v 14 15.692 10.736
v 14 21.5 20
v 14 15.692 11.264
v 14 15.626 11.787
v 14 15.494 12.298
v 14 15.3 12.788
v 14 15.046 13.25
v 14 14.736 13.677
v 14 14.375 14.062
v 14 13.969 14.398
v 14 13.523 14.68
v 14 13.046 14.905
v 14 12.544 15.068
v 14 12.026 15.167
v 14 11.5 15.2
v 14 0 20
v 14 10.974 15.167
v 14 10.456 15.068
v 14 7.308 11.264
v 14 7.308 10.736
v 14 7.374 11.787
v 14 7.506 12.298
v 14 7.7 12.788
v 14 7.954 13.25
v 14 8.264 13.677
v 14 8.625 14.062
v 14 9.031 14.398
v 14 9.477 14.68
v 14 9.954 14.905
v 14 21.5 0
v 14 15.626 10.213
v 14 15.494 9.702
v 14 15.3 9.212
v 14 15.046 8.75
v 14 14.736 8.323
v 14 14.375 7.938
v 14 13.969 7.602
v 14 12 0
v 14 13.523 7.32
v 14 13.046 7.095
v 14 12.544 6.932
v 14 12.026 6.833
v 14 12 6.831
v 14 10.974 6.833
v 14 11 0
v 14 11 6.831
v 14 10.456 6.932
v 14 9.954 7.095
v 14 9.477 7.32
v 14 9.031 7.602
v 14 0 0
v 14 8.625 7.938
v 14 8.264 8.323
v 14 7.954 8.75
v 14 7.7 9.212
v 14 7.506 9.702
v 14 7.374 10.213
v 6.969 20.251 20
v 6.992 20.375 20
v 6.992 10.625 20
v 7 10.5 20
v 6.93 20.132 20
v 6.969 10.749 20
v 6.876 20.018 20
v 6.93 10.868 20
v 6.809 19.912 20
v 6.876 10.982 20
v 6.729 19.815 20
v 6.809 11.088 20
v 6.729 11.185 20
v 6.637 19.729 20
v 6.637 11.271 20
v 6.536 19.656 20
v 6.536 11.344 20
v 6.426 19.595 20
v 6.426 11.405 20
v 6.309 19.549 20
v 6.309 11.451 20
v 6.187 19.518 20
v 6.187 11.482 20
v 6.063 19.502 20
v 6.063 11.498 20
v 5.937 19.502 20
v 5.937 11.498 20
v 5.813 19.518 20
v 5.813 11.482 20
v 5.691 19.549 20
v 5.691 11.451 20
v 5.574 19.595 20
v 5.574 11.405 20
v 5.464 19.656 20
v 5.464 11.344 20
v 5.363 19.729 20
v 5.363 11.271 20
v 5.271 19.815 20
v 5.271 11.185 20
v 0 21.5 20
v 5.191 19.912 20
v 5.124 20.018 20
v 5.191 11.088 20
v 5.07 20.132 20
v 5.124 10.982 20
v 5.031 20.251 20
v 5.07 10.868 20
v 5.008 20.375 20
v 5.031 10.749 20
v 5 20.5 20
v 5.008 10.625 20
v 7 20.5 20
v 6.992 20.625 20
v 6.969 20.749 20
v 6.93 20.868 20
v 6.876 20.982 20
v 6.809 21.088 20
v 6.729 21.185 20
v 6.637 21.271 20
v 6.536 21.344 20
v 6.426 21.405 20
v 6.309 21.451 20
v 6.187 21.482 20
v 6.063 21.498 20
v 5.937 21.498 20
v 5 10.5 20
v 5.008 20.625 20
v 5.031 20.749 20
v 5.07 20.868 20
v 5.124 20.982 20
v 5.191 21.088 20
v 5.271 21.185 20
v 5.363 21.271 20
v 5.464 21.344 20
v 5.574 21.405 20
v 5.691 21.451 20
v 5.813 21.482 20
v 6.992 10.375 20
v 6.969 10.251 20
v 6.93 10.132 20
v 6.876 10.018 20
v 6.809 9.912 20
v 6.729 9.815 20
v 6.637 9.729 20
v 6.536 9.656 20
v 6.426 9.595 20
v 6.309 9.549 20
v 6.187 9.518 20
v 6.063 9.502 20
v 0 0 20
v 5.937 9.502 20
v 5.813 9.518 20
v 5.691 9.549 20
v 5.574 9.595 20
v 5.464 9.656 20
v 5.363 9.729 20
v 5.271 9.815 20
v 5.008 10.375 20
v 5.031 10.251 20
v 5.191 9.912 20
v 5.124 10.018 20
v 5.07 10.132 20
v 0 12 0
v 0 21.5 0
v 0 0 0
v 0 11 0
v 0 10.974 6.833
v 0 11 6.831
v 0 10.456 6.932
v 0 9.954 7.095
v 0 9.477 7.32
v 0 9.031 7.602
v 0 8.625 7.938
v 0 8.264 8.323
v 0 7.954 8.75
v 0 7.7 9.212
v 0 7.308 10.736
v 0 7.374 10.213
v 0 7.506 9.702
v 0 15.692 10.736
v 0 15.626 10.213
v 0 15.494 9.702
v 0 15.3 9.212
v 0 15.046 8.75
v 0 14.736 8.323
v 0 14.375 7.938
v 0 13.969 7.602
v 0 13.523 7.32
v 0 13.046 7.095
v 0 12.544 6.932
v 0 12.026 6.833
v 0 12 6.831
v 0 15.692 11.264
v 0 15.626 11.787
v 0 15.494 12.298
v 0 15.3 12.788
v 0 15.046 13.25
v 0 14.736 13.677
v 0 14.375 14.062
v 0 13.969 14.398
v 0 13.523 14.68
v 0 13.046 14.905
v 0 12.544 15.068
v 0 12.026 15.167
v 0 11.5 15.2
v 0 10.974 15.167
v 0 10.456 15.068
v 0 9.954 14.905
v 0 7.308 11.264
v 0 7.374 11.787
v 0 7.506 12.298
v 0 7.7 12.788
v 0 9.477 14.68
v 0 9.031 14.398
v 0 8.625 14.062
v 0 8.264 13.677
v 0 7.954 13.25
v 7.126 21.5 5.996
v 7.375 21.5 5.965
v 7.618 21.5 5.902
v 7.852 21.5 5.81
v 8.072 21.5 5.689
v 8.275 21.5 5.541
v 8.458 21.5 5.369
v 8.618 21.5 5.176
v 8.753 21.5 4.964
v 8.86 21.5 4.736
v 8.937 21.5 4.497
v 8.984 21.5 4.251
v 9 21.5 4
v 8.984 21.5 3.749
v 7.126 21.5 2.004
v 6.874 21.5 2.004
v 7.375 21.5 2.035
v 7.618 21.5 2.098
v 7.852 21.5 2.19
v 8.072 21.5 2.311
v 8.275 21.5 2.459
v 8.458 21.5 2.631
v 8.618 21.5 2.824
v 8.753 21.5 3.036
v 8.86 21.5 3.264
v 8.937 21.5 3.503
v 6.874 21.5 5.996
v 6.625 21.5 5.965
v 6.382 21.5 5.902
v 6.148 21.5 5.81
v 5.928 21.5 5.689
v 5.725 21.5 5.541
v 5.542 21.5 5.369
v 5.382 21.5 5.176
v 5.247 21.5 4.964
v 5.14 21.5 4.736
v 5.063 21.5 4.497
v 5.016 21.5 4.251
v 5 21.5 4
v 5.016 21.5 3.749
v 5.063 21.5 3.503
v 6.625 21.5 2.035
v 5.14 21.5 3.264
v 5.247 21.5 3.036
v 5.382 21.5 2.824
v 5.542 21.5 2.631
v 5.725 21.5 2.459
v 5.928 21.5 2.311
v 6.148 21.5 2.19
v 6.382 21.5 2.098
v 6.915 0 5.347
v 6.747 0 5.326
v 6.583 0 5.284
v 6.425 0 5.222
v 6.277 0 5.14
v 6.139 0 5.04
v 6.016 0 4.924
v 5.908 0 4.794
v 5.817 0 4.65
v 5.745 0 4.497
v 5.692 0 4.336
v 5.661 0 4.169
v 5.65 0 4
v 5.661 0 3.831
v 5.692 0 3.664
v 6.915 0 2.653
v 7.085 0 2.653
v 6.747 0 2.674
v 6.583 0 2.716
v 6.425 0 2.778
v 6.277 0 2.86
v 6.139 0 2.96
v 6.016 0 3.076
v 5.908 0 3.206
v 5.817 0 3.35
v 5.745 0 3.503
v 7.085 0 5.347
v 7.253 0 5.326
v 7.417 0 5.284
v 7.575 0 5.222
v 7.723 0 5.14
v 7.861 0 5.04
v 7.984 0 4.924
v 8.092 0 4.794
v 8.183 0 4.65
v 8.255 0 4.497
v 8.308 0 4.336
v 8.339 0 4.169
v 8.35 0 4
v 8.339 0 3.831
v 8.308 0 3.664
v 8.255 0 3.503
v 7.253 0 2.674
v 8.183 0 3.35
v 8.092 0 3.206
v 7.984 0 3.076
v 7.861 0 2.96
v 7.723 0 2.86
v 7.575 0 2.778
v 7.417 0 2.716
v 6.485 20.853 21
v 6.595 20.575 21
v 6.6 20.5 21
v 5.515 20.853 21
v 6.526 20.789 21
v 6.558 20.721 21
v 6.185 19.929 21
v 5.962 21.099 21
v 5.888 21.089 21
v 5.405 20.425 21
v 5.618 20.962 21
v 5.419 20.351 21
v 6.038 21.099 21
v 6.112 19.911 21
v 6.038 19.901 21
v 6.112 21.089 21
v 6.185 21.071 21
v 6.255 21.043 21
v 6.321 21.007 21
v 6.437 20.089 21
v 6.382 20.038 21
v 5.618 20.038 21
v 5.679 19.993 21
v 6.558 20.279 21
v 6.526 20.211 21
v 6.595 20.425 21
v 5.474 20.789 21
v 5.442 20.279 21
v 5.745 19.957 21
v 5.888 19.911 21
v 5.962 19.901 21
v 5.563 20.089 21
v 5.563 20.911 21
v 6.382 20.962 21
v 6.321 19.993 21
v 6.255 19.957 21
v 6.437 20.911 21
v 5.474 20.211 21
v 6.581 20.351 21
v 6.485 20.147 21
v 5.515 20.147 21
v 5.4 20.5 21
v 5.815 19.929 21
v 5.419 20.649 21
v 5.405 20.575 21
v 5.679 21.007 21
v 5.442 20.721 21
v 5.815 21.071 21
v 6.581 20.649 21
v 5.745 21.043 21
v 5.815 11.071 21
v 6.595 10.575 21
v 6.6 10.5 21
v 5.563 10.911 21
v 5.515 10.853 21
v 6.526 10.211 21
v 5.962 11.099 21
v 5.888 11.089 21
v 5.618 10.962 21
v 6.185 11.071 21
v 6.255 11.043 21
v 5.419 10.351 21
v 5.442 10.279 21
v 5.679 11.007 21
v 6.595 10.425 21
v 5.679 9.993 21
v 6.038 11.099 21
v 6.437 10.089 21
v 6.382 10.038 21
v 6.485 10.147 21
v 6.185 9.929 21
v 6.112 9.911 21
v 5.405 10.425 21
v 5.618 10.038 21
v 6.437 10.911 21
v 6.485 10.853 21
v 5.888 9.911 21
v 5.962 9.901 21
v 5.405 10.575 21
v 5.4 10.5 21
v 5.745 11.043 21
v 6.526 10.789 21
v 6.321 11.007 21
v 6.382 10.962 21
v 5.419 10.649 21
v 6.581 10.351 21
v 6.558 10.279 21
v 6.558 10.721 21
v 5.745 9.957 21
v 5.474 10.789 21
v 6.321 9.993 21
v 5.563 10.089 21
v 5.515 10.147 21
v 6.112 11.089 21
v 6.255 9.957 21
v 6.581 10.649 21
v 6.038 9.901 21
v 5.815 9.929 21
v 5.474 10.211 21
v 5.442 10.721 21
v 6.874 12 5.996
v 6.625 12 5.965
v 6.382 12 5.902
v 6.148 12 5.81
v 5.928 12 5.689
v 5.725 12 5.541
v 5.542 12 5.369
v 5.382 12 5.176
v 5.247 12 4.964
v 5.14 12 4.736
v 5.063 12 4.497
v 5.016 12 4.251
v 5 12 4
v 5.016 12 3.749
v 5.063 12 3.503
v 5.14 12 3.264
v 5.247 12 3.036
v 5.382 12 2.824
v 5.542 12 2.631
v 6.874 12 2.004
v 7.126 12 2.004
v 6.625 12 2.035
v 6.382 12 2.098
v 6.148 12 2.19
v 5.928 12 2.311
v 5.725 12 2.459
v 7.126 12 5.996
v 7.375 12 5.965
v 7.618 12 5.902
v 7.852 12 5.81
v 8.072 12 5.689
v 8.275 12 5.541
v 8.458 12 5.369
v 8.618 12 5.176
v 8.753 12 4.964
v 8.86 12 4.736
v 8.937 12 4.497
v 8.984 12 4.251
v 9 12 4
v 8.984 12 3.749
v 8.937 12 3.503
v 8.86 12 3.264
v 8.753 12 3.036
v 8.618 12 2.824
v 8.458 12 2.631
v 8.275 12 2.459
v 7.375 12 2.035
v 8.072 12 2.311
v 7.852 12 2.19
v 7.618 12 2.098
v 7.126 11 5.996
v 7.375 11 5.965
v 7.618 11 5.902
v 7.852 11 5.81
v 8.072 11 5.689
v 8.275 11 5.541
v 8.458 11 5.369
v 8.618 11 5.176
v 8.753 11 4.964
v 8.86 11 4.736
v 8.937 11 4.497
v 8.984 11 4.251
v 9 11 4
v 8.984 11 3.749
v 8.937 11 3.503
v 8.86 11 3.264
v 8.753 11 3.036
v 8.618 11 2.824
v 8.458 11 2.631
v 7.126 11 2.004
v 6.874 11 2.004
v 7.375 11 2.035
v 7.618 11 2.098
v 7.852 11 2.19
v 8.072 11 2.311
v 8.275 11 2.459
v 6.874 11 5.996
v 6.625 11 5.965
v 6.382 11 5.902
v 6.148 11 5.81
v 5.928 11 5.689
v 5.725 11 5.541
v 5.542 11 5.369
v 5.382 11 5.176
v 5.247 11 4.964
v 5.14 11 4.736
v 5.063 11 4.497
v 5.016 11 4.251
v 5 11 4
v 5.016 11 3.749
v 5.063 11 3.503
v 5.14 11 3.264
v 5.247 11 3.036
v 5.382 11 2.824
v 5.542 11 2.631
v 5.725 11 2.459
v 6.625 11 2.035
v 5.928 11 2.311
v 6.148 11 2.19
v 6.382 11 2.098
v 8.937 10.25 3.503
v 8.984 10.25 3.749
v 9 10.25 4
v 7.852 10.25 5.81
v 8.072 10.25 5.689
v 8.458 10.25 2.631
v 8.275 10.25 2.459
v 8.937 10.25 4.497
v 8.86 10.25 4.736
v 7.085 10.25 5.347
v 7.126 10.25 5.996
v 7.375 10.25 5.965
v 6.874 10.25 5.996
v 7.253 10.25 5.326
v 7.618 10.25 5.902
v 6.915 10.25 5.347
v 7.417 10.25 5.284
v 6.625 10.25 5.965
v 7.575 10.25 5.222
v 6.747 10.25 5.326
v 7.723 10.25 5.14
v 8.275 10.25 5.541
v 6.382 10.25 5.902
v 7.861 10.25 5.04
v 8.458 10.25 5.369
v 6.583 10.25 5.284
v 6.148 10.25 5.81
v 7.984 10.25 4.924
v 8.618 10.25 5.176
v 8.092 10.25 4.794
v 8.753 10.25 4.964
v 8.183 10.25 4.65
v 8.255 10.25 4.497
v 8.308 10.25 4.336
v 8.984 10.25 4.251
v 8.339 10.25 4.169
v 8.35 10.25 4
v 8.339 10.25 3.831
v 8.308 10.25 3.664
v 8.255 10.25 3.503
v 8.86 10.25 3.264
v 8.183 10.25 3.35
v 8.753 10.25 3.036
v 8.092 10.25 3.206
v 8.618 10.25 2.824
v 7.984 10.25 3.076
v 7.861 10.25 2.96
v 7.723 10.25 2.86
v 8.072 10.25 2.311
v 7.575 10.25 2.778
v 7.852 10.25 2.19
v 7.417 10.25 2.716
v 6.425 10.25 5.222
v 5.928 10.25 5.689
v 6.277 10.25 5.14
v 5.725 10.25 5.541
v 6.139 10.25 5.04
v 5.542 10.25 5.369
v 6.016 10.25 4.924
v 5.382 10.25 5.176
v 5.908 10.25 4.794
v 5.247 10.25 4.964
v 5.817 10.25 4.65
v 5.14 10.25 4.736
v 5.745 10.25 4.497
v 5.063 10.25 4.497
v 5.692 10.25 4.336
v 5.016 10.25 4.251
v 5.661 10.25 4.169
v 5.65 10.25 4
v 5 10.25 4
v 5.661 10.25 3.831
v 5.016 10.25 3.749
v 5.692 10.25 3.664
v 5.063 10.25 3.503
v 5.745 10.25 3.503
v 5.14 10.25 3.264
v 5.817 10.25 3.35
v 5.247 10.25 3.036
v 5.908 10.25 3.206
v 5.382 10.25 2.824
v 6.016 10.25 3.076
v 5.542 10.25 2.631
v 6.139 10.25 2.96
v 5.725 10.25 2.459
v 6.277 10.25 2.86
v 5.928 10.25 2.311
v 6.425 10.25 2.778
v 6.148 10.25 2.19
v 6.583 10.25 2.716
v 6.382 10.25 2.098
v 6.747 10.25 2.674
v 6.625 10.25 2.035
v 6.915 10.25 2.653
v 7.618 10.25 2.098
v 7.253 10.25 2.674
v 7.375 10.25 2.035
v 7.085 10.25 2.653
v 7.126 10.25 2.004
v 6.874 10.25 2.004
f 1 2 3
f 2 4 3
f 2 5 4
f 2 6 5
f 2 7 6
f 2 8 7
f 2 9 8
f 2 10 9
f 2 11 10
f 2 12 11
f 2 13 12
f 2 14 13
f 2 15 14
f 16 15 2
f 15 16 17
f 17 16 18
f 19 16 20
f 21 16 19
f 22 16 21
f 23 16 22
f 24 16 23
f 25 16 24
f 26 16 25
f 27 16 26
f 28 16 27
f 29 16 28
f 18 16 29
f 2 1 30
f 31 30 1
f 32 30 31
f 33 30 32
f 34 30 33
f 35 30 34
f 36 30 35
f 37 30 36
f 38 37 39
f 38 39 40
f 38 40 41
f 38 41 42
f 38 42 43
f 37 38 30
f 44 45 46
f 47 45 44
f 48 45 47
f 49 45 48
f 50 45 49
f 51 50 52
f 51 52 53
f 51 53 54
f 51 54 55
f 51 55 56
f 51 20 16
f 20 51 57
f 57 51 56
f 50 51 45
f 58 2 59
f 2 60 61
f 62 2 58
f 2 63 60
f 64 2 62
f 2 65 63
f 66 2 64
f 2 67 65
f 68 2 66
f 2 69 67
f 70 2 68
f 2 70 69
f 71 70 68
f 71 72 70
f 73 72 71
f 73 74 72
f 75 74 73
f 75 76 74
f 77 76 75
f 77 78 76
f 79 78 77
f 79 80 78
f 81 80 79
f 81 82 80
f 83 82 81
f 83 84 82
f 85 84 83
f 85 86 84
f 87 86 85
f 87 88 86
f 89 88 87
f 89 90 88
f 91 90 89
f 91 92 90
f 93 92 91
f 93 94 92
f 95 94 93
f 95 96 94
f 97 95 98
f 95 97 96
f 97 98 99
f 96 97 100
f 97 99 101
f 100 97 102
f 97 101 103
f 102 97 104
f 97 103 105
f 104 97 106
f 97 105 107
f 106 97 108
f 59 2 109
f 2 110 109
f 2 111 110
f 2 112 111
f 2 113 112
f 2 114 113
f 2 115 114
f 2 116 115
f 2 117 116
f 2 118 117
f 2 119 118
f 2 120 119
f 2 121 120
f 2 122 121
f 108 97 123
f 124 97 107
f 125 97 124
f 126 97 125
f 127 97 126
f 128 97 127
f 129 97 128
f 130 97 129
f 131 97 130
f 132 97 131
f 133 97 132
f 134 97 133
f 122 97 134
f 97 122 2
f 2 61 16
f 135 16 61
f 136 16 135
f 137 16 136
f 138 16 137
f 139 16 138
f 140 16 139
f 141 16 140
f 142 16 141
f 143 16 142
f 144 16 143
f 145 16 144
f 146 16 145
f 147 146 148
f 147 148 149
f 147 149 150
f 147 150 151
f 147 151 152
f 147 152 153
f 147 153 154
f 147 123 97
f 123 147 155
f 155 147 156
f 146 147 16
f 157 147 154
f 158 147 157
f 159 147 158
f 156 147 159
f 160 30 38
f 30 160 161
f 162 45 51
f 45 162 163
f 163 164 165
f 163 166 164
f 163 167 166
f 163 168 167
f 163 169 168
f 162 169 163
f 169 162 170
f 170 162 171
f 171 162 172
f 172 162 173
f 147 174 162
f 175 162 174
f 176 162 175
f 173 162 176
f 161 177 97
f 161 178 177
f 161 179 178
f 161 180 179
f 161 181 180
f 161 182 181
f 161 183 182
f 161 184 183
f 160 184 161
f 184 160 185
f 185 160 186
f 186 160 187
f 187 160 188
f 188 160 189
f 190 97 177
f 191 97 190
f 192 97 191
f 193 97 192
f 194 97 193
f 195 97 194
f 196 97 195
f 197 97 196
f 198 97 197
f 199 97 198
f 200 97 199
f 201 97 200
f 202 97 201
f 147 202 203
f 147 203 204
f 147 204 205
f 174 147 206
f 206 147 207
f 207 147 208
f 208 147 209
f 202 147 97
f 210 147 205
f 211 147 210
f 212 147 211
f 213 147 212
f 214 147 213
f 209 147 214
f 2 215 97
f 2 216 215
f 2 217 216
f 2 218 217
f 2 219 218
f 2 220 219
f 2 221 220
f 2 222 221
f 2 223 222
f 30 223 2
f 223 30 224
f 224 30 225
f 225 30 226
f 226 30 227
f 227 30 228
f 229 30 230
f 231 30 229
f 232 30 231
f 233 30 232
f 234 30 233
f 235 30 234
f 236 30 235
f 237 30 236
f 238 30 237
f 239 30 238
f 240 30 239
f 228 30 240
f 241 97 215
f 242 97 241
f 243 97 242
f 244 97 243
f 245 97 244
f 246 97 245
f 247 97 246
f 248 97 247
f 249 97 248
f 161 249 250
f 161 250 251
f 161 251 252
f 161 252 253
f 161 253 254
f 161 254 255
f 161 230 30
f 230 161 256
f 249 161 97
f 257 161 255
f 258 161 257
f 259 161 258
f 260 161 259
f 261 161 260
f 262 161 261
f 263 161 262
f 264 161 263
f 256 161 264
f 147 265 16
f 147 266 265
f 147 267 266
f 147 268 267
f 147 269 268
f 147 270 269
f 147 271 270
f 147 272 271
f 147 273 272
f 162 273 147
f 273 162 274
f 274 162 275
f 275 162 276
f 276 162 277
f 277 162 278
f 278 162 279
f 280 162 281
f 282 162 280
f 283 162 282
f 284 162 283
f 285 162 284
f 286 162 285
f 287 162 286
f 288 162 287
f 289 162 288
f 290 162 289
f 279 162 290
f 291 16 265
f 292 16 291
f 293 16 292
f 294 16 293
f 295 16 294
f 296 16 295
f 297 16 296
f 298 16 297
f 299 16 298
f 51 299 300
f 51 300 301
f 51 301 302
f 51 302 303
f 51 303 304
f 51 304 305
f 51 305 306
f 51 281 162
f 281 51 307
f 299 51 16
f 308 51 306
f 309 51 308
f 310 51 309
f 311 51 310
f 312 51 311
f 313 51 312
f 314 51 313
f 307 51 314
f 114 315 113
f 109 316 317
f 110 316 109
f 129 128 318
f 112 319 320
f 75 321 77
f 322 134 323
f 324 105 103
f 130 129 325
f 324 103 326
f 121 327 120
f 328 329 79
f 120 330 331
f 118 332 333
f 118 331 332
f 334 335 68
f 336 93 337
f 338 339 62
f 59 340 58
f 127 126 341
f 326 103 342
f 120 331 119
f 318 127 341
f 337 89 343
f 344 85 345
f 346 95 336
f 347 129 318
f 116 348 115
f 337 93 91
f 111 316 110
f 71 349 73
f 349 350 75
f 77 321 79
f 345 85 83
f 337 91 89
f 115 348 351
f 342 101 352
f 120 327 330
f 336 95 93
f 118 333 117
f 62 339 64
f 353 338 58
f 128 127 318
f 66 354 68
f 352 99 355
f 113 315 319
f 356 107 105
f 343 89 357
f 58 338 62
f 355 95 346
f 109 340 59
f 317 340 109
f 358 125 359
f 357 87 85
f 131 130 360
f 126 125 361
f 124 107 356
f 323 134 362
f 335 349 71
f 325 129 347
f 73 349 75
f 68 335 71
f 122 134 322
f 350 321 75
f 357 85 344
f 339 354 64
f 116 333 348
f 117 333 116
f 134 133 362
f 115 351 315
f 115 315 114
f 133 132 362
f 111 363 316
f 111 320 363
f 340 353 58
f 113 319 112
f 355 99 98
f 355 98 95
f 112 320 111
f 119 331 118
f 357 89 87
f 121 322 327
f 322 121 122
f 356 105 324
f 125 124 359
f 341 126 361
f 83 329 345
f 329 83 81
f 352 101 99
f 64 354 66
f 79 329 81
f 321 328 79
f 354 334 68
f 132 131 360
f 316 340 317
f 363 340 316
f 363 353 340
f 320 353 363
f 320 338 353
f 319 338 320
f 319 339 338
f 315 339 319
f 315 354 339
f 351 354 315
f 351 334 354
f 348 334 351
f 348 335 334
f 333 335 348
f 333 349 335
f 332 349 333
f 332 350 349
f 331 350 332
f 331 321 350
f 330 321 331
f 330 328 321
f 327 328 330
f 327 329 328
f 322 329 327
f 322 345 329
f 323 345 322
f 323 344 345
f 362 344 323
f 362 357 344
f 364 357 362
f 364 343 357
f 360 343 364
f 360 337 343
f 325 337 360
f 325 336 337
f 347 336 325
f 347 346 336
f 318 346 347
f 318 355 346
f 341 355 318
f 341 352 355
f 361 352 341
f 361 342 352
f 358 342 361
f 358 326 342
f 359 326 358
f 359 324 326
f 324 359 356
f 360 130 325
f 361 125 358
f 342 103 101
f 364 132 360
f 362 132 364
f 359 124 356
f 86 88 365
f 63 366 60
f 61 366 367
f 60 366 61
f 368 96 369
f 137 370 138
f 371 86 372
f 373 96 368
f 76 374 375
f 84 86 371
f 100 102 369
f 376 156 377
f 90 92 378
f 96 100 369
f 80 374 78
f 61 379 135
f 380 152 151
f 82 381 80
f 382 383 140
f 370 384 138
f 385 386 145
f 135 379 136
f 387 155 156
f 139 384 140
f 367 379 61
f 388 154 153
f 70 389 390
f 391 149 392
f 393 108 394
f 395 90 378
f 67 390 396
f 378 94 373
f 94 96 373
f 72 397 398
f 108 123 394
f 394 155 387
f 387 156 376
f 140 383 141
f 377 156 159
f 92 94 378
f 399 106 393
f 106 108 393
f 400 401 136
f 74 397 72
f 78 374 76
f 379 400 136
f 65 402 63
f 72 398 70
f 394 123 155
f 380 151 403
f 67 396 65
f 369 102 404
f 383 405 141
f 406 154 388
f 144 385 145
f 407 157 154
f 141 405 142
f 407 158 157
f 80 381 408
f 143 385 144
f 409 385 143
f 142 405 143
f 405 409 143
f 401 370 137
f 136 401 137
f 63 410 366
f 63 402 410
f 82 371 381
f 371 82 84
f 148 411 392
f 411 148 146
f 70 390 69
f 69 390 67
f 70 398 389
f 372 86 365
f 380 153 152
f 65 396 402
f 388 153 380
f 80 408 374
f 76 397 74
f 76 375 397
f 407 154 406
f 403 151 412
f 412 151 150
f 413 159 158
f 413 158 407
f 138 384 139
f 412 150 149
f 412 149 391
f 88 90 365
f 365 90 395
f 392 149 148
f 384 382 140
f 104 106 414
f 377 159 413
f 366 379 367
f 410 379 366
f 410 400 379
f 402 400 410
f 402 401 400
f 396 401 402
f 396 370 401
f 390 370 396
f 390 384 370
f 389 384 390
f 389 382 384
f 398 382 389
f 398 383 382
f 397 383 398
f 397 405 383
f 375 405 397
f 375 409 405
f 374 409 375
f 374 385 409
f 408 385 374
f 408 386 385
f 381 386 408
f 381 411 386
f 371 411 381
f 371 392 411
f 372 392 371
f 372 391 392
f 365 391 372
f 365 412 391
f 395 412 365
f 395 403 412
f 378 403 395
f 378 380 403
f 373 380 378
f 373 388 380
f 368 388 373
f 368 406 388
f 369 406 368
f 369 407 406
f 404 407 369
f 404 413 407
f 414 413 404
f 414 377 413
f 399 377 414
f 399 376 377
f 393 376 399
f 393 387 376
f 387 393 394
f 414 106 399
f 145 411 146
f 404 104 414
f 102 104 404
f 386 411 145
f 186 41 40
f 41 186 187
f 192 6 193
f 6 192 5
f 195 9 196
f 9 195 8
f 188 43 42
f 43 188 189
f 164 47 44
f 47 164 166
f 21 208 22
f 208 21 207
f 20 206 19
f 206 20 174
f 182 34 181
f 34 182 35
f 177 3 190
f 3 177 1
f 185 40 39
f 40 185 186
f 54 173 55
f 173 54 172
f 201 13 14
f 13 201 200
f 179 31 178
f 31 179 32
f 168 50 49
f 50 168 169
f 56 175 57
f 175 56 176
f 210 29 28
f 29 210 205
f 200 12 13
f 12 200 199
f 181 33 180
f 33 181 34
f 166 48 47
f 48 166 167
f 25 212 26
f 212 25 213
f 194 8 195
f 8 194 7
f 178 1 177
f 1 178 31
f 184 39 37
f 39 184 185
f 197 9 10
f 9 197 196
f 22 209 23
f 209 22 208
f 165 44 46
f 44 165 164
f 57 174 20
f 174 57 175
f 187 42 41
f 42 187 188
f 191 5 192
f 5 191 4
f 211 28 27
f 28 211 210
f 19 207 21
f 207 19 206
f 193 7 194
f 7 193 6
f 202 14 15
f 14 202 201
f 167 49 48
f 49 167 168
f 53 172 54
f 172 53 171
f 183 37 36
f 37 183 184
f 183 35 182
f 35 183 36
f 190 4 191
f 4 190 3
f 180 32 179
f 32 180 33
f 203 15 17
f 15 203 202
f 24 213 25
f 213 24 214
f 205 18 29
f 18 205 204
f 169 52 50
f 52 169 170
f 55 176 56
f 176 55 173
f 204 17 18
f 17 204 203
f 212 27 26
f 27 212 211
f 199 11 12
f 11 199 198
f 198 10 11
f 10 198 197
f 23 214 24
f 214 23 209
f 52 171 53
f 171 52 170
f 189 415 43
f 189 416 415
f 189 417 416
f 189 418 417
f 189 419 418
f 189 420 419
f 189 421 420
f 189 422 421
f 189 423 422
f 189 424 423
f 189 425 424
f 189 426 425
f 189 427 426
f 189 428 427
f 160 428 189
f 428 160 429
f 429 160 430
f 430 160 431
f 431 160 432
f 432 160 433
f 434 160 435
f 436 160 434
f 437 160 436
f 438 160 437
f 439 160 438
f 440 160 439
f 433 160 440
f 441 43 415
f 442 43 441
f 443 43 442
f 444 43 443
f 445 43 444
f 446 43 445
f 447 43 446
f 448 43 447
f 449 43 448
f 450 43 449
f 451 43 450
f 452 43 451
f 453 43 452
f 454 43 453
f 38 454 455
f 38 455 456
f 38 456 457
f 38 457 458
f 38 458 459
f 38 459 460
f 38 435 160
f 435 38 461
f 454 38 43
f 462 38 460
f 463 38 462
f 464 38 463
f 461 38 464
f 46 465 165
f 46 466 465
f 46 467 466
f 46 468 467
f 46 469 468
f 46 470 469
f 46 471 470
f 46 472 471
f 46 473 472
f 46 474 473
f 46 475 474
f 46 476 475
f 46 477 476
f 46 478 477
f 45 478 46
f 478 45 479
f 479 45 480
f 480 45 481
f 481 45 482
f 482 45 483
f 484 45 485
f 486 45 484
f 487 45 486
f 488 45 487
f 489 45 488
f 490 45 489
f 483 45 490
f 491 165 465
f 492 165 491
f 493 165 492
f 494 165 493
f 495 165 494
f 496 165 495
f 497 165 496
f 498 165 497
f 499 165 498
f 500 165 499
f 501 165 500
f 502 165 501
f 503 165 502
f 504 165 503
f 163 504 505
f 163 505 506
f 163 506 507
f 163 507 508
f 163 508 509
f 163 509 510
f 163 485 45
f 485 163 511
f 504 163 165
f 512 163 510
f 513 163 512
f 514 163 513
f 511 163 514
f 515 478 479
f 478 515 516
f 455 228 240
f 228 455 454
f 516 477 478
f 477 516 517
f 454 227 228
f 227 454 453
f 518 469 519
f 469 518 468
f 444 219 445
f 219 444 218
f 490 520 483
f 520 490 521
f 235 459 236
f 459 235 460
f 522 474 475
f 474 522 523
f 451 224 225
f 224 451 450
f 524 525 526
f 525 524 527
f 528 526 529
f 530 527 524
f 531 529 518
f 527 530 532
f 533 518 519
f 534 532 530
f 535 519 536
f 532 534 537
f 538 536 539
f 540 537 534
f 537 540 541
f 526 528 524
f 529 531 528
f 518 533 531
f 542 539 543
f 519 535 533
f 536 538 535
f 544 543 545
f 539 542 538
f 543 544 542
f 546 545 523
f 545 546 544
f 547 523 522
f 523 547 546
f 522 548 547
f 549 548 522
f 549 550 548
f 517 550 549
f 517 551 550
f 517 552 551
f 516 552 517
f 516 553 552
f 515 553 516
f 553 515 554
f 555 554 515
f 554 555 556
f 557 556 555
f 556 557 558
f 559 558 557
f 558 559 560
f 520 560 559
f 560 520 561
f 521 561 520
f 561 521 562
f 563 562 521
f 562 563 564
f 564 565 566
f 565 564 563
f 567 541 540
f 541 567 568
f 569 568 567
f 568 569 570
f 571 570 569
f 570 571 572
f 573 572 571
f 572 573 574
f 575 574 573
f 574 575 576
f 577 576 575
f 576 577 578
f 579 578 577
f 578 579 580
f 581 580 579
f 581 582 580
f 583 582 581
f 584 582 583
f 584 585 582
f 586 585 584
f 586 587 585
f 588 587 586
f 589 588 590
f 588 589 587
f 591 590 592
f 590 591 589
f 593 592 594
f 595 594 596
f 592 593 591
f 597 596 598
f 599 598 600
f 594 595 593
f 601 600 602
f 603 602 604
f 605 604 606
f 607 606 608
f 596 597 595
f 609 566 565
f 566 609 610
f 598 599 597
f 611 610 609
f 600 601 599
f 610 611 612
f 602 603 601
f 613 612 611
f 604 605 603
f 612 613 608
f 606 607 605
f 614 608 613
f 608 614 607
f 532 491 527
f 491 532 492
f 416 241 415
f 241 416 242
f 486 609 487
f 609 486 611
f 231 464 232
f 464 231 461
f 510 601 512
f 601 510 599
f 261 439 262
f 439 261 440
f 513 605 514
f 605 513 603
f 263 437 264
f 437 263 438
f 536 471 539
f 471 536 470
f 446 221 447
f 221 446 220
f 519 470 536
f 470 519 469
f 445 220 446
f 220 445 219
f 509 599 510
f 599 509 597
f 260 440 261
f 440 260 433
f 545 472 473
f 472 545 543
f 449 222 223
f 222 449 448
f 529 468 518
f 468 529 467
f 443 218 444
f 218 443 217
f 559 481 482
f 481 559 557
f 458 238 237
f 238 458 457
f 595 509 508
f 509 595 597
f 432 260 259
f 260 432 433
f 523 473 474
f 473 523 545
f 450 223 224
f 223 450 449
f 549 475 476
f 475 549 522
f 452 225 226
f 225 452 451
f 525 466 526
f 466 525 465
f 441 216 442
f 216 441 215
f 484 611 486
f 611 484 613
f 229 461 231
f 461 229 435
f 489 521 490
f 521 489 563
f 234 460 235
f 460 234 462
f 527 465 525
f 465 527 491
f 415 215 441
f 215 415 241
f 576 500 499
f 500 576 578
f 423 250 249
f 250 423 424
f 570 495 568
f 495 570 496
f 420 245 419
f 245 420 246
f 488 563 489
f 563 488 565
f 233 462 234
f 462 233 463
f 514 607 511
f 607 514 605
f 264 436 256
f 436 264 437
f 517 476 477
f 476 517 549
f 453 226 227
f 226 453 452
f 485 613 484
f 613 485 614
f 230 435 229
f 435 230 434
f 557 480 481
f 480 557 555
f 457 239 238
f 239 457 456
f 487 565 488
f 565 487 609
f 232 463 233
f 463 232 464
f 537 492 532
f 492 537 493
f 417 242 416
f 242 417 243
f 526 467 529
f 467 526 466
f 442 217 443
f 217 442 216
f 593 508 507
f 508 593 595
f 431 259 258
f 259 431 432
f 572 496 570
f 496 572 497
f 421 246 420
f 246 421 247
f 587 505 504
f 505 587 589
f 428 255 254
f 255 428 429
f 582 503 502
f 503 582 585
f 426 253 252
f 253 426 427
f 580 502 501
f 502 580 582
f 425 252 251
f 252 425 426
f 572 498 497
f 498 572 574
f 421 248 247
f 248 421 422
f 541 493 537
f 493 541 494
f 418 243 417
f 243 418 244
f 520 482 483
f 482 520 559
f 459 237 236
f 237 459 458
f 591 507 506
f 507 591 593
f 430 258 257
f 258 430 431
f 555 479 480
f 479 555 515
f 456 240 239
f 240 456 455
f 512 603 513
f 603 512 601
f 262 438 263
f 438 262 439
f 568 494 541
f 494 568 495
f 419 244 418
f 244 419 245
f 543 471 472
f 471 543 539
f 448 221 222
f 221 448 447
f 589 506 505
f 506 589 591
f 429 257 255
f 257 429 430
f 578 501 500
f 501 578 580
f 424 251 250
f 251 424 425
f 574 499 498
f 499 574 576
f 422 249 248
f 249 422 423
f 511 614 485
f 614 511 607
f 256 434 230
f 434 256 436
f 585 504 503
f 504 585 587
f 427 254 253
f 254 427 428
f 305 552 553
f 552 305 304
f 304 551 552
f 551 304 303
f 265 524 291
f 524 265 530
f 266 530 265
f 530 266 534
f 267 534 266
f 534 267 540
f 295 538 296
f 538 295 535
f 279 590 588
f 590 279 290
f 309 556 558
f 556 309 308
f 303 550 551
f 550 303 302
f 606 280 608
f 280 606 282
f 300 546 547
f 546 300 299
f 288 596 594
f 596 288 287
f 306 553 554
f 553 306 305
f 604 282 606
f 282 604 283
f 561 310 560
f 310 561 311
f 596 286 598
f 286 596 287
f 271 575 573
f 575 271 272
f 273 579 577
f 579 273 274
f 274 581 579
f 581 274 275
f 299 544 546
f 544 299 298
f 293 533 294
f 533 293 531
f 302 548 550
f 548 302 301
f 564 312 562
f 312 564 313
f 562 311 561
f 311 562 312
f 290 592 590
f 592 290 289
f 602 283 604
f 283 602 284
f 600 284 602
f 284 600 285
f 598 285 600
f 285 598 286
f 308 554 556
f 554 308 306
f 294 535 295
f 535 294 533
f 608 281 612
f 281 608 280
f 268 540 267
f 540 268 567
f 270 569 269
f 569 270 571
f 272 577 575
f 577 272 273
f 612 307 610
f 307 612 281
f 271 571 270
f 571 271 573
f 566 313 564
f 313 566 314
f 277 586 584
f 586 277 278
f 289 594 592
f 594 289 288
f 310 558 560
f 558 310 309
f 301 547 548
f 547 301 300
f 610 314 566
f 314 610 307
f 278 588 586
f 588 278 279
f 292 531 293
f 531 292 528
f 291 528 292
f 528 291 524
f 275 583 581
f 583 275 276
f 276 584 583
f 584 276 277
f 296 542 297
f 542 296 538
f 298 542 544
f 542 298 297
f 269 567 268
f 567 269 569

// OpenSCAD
height=20;
long=14;
larg=21.5;
r_arbre=4.2;
r_m3=2;
r_ecrou_m3=3.3;

module endstop_x(){
	difference(){	
		union(){
			cube([long,larg,height]);

			//cônes pour endstop
			translate([long-8,larg-1,height]){cylinder(h = 1, r1 = 1, r2 = 0.6, $fn=50);}
			translate([long-8,larg-11,height]){cylinder(h = 1, r1 = 1, r2 = 0.6, $fn=50);}
			
		}
		
		//trou pour passage arbre
		translate([-5,larg-10,11]){rotate([0,90,0])cylinder(r=r_arbre, h=30, $fn=50);}
		translate([-5,larg-10-0.5,-5]){cube([30,1,16]);}

		//trou pour serrage arbre avec vis
		translate([long/2,larg/2-0.5,4]){rotate([-90,0,0])cylinder(r=r_m3, h=15, $fn=50);}
		translate([long/2,-0.5,4]){rotate([-90,0,0])cylinder(r=1.35, h=larg/2+1, $fn=50);}

		
	}
}
endstop_x();
